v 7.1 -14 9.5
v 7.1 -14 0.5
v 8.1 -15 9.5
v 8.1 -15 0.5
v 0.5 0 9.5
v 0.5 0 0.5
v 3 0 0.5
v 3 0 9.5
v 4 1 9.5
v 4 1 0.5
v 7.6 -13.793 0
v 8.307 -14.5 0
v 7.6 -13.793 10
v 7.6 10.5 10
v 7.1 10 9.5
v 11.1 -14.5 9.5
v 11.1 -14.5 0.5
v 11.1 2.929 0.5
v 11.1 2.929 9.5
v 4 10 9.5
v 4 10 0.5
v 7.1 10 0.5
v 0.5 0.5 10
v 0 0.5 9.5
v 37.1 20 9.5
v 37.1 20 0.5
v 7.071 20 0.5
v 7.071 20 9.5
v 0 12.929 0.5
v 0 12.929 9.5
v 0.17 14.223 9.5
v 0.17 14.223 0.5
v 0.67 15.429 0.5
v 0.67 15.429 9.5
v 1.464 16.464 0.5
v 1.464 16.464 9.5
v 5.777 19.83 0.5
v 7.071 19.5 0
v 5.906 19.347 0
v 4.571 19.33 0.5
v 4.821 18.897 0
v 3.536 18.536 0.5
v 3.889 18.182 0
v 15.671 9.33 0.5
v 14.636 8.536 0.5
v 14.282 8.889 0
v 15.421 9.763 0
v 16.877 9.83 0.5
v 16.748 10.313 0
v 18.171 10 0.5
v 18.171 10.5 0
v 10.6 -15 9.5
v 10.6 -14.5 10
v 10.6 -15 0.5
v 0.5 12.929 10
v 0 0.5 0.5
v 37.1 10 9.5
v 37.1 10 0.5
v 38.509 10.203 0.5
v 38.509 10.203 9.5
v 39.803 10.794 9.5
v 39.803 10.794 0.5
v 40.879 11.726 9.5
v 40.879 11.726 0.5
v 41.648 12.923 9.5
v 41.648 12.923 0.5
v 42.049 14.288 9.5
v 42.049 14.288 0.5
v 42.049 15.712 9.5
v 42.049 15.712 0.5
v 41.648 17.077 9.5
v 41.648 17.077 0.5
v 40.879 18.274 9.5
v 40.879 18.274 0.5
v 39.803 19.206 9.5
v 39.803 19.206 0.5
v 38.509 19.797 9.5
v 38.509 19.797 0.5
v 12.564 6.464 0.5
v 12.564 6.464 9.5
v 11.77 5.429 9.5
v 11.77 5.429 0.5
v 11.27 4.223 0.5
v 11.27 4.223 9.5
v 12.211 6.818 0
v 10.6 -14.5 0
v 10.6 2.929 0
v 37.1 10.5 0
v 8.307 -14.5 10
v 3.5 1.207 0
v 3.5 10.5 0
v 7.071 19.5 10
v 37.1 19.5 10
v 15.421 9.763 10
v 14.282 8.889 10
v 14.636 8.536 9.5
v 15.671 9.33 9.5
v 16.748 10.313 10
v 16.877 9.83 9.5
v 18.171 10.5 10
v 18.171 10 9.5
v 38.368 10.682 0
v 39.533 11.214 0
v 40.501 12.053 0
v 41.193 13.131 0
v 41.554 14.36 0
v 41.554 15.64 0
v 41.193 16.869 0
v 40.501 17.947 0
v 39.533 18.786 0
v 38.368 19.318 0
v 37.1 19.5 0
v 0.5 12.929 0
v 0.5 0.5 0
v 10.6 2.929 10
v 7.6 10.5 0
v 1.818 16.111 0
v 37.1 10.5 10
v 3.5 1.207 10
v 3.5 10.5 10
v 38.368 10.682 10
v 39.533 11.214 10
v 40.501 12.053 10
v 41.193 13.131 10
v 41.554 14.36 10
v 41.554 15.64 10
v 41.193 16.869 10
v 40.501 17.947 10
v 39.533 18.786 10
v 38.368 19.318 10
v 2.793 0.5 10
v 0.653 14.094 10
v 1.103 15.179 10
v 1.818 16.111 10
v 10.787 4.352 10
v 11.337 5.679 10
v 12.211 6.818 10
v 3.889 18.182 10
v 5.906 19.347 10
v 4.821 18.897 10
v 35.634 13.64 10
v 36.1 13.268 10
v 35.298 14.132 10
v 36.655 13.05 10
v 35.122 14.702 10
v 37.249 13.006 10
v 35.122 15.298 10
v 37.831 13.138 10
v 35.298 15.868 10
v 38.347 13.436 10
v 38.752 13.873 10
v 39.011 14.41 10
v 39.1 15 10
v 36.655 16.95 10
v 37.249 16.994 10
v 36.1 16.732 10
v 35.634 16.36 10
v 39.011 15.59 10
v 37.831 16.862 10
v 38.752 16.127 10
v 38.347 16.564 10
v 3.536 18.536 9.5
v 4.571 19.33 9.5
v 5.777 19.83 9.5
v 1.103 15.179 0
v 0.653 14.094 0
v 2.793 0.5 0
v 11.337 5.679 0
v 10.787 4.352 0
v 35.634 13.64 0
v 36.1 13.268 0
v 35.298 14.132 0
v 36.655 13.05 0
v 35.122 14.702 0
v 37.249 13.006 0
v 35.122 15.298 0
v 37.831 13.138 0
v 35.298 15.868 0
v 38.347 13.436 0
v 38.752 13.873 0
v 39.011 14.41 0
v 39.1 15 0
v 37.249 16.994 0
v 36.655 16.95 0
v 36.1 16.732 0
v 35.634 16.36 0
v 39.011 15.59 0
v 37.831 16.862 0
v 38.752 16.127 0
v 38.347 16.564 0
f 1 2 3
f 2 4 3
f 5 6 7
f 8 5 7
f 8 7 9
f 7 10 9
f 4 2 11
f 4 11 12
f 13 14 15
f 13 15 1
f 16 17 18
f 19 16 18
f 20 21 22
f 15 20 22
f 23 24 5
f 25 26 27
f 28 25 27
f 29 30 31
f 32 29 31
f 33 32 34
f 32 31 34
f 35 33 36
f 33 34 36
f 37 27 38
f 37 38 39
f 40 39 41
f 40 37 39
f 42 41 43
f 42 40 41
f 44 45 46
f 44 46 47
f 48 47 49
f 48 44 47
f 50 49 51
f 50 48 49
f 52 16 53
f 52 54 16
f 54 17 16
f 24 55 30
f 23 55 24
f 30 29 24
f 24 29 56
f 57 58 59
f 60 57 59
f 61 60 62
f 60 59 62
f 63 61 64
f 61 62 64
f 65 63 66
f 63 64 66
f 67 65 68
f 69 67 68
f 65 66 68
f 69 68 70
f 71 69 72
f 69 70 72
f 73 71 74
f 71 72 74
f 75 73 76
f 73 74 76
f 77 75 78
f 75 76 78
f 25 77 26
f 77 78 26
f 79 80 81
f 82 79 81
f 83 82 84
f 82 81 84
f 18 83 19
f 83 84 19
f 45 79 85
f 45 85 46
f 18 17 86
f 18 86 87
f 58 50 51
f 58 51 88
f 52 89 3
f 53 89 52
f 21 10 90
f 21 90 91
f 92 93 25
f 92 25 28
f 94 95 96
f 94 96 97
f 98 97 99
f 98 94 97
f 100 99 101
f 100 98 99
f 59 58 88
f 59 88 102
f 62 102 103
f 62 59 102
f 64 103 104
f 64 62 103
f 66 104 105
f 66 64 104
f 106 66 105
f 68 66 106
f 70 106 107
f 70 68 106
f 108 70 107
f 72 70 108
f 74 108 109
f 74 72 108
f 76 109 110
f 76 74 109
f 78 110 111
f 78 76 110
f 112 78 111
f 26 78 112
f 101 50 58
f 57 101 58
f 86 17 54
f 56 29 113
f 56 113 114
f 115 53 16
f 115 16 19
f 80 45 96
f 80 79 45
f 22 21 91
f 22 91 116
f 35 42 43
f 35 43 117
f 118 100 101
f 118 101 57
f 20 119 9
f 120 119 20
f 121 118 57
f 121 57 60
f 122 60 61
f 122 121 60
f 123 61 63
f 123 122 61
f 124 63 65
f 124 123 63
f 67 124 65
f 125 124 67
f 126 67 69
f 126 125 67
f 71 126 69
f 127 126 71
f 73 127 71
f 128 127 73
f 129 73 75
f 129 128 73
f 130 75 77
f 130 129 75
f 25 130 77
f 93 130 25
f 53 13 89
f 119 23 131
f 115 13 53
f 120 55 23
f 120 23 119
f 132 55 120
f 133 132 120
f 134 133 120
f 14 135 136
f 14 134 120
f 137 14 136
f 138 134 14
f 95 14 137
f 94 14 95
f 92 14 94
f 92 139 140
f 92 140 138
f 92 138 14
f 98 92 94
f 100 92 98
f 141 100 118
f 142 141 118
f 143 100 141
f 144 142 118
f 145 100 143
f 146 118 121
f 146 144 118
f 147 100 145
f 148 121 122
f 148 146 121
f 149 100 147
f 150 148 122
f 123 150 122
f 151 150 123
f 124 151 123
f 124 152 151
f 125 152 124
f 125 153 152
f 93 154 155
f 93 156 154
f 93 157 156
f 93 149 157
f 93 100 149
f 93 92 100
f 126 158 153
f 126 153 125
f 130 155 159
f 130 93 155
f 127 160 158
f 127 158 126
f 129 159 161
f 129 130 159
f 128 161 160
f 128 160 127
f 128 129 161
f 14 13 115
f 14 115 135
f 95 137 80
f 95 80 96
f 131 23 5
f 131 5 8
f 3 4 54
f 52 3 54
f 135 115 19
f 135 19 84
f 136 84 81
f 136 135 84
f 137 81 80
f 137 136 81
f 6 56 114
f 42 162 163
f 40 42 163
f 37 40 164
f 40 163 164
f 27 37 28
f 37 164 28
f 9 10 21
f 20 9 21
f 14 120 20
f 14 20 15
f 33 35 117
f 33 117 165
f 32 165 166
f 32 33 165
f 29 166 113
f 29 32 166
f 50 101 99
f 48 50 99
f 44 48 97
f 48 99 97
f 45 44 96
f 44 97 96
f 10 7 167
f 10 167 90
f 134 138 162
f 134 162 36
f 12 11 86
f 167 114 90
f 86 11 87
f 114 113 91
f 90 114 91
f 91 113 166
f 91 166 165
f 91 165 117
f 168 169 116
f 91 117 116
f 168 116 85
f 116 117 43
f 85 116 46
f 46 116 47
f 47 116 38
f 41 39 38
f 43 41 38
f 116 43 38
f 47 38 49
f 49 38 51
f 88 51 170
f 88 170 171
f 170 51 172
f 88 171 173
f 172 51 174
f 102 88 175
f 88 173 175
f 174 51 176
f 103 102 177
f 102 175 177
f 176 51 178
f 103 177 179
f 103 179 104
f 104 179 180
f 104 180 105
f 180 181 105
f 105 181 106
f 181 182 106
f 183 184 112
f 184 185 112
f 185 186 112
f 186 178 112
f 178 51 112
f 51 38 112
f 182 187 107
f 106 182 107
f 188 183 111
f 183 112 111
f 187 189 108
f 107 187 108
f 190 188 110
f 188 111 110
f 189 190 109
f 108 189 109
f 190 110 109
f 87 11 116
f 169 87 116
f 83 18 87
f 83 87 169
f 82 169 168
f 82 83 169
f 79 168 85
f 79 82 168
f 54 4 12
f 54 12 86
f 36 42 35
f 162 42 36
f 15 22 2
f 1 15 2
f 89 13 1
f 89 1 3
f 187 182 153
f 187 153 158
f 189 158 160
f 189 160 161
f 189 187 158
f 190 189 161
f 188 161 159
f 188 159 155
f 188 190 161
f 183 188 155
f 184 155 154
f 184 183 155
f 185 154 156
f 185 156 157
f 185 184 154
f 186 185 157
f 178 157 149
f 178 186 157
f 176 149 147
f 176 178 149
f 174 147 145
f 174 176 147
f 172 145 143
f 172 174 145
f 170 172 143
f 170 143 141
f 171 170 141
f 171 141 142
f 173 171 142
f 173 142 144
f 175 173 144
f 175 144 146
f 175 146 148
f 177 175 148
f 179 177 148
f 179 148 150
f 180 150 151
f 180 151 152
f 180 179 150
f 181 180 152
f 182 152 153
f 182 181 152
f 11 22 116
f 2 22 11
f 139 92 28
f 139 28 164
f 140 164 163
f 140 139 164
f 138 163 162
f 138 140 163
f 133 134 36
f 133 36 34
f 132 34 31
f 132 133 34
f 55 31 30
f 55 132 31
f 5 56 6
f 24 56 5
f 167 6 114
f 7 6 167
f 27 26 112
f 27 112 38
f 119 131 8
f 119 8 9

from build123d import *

# Parameters (mm, degrees)
F0_R     = 2
F1_DEPTH = 10
F2_SIZE  = 5
F3_R     = 5
F4_SIZE  = 1
F5_SIZE  = 0.5


with BuildPart() as f1:
    # F0 (on Top) → F1 (new body)
    with BuildSketch(Plane.XY):
        with BuildLine():
            Line((0, 20), (0, 0))
            Line((0, 0), (4, 0))
            Line((4, 0), (4, 10))
            Line((4, 10), (7.1, 10))
            Line((7.1, 10), (7.1, -15))
            Line((7.1, -15), (11.1, -15))
            Line((11.1, -15), (11.1, 10))
            Line((11.1, 10), (37.1, 10))
            ThreePointArc((37.1, 10), (42.1, 15), (37.1, 20))
            Line((37.1, 20), (0, 20))
        make_face()
        with Locations((37.1, 15)):
            Circle(F0_R, mode=Mode.SUBTRACT)
    extrude(amount=F1_DEPTH)

    # F2
    f2_edges = [f1.edges().sort_by_distance(p)[0] for p in [
        (0, 20, 5),
        (11.1, 10, 5),
    ]]
    chamfer(f2_edges, length=F2_SIZE)

    # F3
    f3_edges = [f1.edges().sort_by_distance(p)[0] for p in [
        (0, 15, 5),
        (5, 20, 5),
        (16.1, 10, 5),
        (11.1, 5, 5),
    ]]
    fillet(f3_edges, radius=F3_R)

    # F4
    f4_edges = [f1.edges().sort_by_distance(p)[0] for p in [
        (4, 0, 5),
        (7.1, -15, 5),
    ]]
    chamfer(f4_edges, length=F4_SIZE)

    # F5
    f5_edges = [f1.edges().sort_by_distance(p)[0] for p in [
        (0, 0, 5),
        (11.1, -15, 5),
        (27.635534, 10, 10),
        (27.635534, 10, 0),
        (1.5, 0, 10),
        (3.5, 0.5, 10),
        (4, 5.5, 10),
        (5.55, 10, 10),
        (7.1, -2, 10),
        (9.6, -15, 10),
        (7.6, -14.5, 10),
        (1.5, 0, 0),
        (3.5, 0.5, 0),
        (4, 5.5, 0),
        (5.55, 10, 0),
        (7.1, -2, 0),
        (7.6, -14.5, 0),
        (9.6, -15, 0),
    ]]
    chamfer(f5_edges, length=F5_SIZE)


solid = f1.part
